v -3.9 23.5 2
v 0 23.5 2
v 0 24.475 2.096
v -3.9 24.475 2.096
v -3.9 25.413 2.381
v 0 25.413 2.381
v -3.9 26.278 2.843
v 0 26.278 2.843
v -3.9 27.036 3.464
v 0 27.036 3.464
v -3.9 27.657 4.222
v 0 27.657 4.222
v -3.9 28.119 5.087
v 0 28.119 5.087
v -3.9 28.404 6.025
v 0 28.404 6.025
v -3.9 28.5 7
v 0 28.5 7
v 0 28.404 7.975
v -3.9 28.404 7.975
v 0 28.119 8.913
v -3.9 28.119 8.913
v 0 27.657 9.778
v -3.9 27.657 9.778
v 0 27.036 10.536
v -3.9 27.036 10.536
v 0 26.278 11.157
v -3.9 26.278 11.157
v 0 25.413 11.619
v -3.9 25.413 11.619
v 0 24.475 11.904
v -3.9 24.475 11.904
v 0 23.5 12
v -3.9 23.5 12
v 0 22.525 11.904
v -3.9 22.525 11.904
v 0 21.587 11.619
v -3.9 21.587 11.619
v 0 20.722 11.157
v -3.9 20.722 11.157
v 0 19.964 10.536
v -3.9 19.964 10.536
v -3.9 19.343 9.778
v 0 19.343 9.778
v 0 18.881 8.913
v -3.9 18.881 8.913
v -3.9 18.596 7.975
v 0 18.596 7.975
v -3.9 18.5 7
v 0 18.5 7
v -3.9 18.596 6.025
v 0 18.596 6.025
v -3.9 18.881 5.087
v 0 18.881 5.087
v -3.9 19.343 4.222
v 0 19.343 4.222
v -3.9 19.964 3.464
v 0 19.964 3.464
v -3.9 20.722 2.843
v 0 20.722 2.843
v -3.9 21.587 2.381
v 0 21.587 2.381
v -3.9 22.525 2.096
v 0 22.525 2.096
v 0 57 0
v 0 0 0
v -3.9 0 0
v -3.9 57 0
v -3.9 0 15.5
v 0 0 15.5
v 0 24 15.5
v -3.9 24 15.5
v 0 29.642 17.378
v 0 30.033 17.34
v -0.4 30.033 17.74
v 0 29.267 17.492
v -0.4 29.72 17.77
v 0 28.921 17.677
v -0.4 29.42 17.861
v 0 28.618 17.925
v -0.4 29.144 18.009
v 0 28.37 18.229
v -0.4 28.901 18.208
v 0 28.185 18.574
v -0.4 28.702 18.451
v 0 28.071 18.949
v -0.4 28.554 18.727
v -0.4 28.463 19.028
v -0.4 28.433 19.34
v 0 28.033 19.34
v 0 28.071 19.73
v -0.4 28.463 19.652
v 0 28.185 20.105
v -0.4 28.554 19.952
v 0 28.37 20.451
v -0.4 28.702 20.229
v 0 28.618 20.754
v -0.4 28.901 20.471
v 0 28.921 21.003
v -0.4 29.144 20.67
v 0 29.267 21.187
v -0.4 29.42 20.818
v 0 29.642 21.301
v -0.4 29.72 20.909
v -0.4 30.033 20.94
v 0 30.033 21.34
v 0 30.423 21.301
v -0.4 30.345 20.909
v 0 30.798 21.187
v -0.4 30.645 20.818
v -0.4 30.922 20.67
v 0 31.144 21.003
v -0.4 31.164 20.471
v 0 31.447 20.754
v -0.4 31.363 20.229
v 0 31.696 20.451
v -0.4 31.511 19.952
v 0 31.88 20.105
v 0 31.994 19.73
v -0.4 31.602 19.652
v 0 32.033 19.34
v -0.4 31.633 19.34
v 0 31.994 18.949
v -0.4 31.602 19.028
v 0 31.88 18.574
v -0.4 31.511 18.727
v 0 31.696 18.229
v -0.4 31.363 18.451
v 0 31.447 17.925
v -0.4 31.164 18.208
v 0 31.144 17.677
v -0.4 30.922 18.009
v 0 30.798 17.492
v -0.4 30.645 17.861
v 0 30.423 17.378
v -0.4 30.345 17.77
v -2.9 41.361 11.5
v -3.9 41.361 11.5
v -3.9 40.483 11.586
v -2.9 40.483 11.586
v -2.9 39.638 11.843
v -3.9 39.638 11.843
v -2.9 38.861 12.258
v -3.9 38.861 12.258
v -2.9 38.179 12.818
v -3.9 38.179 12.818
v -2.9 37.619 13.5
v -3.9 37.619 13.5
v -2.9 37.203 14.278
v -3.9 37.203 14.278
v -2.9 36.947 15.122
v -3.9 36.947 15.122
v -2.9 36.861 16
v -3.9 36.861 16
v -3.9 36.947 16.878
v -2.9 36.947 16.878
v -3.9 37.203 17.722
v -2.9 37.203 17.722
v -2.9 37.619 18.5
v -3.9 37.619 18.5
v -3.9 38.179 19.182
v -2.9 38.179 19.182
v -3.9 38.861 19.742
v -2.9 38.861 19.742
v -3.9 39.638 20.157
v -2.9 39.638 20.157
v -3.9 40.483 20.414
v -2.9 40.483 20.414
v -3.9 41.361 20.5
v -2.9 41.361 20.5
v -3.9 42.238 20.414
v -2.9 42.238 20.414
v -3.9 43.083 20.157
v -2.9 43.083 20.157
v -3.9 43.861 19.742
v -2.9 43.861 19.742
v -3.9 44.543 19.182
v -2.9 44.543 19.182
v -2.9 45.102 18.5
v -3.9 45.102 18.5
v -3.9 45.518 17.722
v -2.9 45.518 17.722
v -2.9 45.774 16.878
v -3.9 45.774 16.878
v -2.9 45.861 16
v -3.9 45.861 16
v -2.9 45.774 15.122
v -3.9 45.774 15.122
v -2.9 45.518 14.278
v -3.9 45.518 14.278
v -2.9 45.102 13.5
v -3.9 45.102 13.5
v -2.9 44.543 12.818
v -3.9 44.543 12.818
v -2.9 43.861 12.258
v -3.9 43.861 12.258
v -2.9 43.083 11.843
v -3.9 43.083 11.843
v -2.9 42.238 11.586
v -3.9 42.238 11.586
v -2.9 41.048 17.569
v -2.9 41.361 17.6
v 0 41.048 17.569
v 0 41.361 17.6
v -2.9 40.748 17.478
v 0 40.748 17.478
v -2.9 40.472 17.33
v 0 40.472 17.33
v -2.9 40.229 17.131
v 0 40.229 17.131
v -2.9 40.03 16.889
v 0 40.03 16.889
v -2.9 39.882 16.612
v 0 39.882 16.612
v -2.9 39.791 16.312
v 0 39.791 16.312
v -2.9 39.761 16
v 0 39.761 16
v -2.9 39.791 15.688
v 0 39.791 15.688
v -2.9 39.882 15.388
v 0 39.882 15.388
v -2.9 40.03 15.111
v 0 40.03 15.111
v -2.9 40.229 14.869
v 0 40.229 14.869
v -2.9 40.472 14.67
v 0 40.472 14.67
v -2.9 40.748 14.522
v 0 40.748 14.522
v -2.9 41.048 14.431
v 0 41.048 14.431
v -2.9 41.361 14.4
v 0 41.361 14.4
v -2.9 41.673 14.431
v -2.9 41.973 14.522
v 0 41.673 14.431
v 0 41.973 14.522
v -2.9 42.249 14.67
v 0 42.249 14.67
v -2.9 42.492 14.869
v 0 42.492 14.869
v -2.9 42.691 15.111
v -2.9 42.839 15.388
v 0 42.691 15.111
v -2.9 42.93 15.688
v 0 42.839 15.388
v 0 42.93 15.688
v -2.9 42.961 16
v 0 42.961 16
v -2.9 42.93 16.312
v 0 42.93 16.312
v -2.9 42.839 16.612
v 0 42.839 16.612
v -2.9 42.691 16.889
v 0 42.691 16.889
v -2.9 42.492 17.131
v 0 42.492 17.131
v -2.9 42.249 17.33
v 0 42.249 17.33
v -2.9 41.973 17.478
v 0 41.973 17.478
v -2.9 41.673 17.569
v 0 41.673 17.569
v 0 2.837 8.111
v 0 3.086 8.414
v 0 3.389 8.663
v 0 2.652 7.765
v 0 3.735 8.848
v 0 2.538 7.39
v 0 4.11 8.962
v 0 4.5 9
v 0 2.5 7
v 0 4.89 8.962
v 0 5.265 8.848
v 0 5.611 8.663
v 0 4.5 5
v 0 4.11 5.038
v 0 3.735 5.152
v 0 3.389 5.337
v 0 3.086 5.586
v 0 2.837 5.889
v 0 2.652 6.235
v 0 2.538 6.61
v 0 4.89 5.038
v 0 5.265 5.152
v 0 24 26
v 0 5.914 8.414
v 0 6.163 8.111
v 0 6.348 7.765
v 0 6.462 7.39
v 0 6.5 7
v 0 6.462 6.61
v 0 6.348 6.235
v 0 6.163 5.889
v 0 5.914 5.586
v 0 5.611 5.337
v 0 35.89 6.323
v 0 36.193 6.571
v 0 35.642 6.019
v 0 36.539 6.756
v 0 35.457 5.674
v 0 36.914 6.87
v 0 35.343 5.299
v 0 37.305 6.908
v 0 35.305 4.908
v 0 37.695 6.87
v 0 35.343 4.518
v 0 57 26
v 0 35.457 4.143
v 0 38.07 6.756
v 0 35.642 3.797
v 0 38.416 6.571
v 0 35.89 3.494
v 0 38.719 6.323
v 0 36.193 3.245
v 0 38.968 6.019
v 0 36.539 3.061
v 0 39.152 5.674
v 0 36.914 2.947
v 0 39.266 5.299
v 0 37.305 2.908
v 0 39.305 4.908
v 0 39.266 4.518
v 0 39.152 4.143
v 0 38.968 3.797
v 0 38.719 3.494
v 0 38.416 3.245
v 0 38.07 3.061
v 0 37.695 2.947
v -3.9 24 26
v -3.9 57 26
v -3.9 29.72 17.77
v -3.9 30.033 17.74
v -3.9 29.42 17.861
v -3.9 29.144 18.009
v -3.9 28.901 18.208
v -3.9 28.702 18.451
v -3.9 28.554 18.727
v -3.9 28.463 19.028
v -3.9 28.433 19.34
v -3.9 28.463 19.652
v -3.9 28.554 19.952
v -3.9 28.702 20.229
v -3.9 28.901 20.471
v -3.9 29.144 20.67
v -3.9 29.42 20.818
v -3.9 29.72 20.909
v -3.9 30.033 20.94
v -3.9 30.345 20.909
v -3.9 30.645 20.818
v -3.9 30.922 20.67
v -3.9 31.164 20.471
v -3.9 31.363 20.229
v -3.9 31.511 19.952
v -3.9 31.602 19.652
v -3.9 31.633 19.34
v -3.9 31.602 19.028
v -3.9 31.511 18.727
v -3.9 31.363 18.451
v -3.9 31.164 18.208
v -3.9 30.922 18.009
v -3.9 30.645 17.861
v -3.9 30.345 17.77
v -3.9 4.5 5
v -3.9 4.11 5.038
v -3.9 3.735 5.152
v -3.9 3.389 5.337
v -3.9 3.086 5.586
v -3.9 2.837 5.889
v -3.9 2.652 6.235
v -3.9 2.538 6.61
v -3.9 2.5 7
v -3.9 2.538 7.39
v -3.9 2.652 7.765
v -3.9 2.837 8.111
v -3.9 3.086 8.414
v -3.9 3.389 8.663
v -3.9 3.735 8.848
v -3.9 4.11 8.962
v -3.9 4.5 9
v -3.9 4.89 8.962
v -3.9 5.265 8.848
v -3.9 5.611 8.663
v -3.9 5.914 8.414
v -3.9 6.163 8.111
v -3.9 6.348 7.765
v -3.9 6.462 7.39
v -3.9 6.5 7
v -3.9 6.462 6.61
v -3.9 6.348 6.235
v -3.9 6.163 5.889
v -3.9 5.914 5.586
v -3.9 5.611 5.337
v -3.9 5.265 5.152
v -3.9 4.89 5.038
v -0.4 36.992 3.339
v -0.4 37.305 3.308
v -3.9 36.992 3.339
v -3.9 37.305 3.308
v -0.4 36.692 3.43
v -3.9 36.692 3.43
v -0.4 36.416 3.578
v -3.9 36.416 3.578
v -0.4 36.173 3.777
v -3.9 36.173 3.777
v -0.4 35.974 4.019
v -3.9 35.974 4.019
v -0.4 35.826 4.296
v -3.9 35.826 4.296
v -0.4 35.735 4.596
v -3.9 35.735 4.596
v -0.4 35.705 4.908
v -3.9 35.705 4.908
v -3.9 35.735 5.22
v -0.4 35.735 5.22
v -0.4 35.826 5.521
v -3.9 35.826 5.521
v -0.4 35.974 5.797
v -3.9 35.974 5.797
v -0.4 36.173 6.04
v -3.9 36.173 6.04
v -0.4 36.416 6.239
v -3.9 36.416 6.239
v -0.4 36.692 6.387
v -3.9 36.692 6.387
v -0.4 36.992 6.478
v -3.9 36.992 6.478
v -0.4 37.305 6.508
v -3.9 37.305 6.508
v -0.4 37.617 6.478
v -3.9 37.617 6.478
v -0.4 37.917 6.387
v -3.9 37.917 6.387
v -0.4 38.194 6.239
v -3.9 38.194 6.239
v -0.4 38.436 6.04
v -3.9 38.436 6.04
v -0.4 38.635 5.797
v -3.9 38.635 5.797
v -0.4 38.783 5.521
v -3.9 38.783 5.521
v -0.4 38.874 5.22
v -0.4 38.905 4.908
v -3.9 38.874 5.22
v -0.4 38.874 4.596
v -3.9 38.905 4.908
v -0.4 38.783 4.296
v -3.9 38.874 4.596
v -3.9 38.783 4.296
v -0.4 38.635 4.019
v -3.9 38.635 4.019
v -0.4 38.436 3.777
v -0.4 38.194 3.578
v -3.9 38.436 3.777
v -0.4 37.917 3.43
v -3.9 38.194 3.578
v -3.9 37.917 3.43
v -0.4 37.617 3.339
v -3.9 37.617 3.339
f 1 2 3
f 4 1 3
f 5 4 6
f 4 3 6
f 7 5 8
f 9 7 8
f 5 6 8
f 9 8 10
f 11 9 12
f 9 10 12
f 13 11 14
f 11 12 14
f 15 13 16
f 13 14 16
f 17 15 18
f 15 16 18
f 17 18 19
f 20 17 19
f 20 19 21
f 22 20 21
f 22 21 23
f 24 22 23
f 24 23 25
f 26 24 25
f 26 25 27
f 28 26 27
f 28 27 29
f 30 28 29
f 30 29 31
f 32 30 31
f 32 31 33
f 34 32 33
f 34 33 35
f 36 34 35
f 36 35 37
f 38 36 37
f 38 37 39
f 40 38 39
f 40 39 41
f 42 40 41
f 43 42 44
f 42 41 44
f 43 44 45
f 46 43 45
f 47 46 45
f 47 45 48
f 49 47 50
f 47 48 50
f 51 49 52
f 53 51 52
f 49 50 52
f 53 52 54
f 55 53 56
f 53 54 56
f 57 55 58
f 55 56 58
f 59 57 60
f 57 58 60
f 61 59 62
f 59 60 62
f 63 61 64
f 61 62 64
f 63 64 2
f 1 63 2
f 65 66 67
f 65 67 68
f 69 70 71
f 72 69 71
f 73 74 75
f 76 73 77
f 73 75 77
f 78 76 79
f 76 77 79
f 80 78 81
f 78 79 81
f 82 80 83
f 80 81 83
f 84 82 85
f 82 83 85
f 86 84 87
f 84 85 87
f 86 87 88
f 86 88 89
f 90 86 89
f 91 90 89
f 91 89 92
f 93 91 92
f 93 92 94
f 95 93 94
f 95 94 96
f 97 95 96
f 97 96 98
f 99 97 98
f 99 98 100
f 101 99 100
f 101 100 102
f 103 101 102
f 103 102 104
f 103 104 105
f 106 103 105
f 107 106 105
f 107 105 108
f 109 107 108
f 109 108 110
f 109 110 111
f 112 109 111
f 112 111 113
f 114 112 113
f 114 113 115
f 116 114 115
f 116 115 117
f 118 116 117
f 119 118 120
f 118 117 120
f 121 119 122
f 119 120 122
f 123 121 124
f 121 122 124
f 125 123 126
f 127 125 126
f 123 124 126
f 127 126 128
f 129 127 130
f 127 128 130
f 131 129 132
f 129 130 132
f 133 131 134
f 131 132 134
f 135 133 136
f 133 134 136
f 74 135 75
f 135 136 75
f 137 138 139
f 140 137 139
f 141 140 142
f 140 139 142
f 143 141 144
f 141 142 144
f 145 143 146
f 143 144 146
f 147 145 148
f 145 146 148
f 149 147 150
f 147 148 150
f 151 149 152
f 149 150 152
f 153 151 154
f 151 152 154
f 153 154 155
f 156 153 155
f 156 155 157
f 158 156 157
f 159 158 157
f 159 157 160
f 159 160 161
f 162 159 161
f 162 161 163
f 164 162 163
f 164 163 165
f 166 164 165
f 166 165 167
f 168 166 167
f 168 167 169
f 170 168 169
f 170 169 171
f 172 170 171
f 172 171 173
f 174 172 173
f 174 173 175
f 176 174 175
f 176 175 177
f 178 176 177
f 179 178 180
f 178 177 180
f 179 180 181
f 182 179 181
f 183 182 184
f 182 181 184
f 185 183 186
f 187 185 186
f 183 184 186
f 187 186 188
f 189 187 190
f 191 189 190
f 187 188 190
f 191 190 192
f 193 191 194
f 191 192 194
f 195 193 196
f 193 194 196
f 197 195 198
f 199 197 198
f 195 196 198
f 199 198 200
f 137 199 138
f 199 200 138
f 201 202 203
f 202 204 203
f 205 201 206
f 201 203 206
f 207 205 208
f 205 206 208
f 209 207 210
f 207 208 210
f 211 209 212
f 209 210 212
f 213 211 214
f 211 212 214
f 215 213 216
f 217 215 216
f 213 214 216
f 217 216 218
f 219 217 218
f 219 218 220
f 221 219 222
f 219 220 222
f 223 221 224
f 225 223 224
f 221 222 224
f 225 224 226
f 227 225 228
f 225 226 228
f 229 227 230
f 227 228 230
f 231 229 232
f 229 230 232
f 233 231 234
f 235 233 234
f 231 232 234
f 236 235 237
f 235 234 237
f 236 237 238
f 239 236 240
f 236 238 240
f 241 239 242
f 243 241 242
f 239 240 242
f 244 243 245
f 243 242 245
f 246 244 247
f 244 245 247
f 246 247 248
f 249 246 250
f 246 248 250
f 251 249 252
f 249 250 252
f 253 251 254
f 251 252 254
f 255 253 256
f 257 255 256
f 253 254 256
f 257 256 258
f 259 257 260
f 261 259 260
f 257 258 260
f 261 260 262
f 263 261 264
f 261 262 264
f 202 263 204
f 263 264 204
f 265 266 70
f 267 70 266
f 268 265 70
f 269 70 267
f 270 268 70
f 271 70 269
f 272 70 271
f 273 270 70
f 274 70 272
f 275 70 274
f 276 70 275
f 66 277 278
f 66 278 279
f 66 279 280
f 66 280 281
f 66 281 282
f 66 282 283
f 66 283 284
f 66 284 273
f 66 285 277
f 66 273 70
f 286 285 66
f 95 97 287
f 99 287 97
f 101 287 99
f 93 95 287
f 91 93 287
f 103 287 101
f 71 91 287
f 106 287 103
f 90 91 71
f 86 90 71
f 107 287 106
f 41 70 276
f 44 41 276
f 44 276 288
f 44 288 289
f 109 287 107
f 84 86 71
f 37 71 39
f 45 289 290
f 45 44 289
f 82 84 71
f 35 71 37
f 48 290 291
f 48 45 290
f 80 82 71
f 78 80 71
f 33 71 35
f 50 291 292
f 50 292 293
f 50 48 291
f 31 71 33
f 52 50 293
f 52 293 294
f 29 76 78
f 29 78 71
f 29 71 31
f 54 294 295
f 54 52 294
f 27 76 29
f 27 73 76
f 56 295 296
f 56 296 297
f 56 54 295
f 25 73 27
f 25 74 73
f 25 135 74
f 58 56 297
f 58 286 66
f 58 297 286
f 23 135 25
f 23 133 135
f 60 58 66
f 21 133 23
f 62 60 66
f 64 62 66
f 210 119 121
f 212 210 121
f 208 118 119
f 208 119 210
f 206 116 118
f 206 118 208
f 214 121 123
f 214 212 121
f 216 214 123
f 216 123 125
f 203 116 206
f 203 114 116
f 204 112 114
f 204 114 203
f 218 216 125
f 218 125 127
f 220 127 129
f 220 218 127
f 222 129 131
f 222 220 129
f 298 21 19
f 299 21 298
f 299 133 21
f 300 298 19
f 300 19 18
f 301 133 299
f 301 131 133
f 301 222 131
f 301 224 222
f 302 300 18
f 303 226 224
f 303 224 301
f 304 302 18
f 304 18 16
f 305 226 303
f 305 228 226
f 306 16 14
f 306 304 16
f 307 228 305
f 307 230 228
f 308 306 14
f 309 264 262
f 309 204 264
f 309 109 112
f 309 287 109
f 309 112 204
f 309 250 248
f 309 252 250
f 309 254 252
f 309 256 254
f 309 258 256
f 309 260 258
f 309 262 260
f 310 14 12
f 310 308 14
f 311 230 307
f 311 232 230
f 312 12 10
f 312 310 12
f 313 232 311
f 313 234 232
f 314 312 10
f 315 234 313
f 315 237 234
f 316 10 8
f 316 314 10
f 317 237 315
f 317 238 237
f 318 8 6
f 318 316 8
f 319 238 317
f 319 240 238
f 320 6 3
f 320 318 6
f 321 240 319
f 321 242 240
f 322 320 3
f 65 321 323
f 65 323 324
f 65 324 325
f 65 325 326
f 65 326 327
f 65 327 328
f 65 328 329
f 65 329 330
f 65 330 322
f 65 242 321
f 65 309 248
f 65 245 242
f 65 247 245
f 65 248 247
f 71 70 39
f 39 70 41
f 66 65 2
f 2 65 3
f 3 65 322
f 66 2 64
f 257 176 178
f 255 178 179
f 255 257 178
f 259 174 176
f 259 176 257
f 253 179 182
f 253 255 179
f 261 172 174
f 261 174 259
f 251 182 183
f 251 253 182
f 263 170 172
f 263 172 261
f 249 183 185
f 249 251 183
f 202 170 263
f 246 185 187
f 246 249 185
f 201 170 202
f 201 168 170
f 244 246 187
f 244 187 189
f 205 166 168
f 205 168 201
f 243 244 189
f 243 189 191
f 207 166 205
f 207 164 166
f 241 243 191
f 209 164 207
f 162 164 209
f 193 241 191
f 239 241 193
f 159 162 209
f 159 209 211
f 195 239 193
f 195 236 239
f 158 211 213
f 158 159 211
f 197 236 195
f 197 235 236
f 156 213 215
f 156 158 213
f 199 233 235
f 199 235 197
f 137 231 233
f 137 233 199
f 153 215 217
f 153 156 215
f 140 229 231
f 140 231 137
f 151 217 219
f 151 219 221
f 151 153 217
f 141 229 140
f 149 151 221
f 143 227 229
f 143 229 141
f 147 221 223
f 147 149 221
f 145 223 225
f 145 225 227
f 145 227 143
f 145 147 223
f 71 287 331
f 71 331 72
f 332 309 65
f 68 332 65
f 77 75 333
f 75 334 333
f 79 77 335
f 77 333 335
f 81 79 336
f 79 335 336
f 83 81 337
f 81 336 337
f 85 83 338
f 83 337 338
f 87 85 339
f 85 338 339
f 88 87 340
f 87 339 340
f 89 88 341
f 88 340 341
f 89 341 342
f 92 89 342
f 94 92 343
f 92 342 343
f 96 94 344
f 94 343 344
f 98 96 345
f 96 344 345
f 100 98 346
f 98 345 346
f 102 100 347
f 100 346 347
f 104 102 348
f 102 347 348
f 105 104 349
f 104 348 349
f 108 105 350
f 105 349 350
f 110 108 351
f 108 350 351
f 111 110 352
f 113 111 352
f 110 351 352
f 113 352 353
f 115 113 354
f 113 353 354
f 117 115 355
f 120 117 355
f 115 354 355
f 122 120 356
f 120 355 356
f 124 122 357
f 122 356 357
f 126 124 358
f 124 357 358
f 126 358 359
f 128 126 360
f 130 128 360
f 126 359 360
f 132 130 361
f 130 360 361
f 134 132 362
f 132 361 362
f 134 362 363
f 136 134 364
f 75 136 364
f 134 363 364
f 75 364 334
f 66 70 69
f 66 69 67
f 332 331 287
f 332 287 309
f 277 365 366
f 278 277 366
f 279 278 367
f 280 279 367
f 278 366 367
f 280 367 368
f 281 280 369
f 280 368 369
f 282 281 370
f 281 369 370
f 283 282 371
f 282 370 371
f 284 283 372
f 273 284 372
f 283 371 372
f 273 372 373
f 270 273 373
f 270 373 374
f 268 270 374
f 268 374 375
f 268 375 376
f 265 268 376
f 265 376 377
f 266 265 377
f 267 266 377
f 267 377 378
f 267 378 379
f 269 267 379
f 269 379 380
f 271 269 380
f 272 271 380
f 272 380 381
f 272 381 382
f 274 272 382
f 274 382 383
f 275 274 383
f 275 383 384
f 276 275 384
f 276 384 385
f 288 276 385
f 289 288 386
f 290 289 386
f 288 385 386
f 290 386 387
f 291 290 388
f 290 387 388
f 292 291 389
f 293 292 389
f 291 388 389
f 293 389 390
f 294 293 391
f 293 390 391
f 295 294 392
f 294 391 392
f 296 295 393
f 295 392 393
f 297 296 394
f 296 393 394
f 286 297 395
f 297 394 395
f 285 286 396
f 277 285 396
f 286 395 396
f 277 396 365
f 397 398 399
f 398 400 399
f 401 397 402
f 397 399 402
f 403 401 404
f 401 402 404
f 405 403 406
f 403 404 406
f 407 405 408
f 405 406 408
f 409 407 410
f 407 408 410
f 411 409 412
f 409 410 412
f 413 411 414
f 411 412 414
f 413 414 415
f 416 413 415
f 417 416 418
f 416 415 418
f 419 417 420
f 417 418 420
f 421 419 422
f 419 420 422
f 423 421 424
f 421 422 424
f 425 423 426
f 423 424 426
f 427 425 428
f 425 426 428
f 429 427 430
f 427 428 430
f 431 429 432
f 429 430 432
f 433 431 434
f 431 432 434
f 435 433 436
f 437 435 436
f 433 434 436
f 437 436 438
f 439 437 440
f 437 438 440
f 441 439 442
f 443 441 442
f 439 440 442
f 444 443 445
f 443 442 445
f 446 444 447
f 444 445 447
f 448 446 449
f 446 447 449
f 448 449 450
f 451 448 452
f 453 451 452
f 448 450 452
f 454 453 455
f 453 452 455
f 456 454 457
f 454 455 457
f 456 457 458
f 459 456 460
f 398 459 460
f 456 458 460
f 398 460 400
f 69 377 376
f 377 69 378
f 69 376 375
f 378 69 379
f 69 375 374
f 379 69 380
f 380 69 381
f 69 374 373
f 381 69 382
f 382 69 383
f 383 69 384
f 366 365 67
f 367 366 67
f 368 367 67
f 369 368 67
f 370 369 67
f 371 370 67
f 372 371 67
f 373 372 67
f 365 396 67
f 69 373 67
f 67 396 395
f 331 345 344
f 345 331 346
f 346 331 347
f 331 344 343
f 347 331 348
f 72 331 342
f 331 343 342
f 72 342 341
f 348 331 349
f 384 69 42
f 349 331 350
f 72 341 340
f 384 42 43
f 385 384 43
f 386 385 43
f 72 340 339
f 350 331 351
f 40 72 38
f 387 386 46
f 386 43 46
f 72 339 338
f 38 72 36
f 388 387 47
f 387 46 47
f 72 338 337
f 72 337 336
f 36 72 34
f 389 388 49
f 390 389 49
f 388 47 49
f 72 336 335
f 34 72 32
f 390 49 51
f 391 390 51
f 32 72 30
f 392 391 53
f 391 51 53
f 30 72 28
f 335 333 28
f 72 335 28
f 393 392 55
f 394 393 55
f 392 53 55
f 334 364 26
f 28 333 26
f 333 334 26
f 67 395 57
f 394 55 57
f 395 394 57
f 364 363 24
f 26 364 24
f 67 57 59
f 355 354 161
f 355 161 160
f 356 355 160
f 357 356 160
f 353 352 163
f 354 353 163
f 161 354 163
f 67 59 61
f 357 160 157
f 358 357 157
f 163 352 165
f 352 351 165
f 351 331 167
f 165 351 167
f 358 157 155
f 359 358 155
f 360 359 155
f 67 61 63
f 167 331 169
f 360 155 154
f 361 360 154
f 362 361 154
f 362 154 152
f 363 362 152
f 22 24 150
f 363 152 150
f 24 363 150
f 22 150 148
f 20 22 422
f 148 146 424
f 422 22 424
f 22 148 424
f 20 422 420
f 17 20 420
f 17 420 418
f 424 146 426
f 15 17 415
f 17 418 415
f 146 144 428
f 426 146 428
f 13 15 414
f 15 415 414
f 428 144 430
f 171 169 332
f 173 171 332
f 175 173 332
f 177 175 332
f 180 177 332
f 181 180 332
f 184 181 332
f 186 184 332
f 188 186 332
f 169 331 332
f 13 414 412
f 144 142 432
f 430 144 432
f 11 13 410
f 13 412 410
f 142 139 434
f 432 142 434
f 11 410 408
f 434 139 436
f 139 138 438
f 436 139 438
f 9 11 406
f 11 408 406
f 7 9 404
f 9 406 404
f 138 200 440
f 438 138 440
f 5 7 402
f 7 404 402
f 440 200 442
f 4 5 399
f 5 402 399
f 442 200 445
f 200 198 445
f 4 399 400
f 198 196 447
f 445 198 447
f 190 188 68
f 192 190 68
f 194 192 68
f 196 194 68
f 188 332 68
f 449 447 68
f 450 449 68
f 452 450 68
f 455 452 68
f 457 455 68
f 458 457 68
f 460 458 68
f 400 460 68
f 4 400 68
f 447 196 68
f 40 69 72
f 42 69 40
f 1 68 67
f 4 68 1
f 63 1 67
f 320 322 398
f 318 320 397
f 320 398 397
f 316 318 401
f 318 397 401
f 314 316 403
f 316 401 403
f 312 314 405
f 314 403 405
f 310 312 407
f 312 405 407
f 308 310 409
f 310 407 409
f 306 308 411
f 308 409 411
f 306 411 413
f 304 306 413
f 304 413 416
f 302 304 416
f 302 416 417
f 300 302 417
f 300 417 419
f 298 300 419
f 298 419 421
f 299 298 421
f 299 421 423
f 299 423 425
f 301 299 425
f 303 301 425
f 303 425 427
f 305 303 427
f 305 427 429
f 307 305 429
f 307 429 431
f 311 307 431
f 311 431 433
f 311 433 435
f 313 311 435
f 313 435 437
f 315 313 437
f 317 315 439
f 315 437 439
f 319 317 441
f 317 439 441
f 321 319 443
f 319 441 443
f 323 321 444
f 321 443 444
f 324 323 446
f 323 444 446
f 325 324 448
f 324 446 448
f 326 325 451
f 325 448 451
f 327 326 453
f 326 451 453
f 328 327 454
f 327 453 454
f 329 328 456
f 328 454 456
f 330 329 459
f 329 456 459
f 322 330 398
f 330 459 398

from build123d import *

# Parameters (mm, degrees)
SKETCH1_W                                        = 30
SKETCH1_H                                        = 57
BOSS_EXTRUDE1_DEPTH                              = 3.9
SKETCH2_R                                        = 5
CUT_EXTRUDE1_DEPTH                               = 65.530690373
F_4_0_4_DIAMETER_HOLE1_D                         = 4
SKETCH12_W                                       = 14.5
SKETCH12_H                                       = 24
CUT_EXTRUDE2_DEPTH                               = 65.530690373
CBORE_FOR_M3_PAN_HEAD_MACHINE_SCREW2_D           = 3.2
CBORE_FOR_M3_PAN_HEAD_MACHINE_SCREW2_CBORE_D     = 9
CBORE_FOR_M3_PAN_HEAD_MACHINE_SCREW2_CBORE_DEPTH = 1
CSK_FOR_M3_FLAT_HEAD_MACHINE_SCREW1_D            = 3.2
CSK_FOR_M3_FLAT_HEAD_MACHINE_SCREW1_CSINK_D      = 4
CSK_FOR_M3_FLAT_HEAD_MACHINE_SCREW1_CSINK_ANGLE  = 90
SKETCH19_W                                       = 4
SKETCH19_H                                       = 33
CUT_EXTRUDE3_DEPTH                               = 65.530690373


with BuildPart() as part:
    # Sketch1 → Boss-Extrude1 (new body)
    with BuildSketch(Plane(origin=(0, 0, 0), x_dir=(0, 0, -1), z_dir=(1, 0, 0))):
        with Locations((-15, 28.5)):
            Rectangle(SKETCH1_W, SKETCH1_H)
    extrude(amount=-BOSS_EXTRUDE1_DEPTH)

    # Sketch2 → Cut-Extrude1 (cut, through all)
    with BuildSketch(Plane(origin=(0, 0, 0), x_dir=(0, 0, -1), z_dir=(1, 0, 0))):
        with Locations((-7, 23.5)):
            Circle(SKETCH2_R)
    extrude(amount=-CUT_EXTRUDE1_DEPTH, mode=Mode.SUBTRACT)

    # Ø4.0 (4) Diameter Hole1 (through all)
    with Locations(Plane(origin=(0, 4.5, 7), x_dir=(0, 0, 1), z_dir=(1, 0, 0))):
        with Locations((0, 0)):
            Hole(F_4_0_4_DIAMETER_HOLE1_D / 2)

    # Sketch12 → Cut-Extrude2 (cut, through all)
    with BuildSketch(Plane(origin=(0, 0, 0), x_dir=(0, 0, -1), z_dir=(1, 0, 0))):
        with Locations((-22.75, 12)):
            Rectangle(SKETCH12_W, SKETCH12_H)
    extrude(amount=-CUT_EXTRUDE2_DEPTH, mode=Mode.SUBTRACT)

    # CBORE for M3 Pan Head Machine Screw2 (through all)
    with Locations(Plane(origin=(-3.9, 41.360571099, 16), x_dir=(0, 0, -1), z_dir=(-1, 0, 0))):
        with Locations((0, 0)):
            CounterBoreHole(CBORE_FOR_M3_PAN_HEAD_MACHINE_SCREW2_D / 2, CBORE_FOR_M3_PAN_HEAD_MACHINE_SCREW2_CBORE_D / 2, CBORE_FOR_M3_PAN_HEAD_MACHINE_SCREW2_CBORE_DEPTH)

    # CSK for M3 Flat Head Machine Screw1 (through all)
    with Locations(Plane(origin=(0, 30.032608687, 19.33966579), x_dir=(0, 0, 1), z_dir=(1, 0, 0))):
        with Locations((0, 0), (-14.431341448, -7.272)):
            CounterSinkHole(CSK_FOR_M3_FLAT_HEAD_MACHINE_SCREW1_D / 2, CSK_FOR_M3_FLAT_HEAD_MACHINE_SCREW1_CSINK_D / 2, counter_sink_angle=CSK_FOR_M3_FLAT_HEAD_MACHINE_SCREW1_CSINK_ANGLE)

    # Sketch19 → Cut-Extrude3 (cut, through all)
    with BuildSketch(Plane.ZY.offset(3.9)):
        with Locations((28, 40.5)):
            Rectangle(SKETCH19_W, SKETCH19_H)
    extrude(amount=-CUT_EXTRUDE3_DEPTH, mode=Mode.SUBTRACT)


solid = part.part
